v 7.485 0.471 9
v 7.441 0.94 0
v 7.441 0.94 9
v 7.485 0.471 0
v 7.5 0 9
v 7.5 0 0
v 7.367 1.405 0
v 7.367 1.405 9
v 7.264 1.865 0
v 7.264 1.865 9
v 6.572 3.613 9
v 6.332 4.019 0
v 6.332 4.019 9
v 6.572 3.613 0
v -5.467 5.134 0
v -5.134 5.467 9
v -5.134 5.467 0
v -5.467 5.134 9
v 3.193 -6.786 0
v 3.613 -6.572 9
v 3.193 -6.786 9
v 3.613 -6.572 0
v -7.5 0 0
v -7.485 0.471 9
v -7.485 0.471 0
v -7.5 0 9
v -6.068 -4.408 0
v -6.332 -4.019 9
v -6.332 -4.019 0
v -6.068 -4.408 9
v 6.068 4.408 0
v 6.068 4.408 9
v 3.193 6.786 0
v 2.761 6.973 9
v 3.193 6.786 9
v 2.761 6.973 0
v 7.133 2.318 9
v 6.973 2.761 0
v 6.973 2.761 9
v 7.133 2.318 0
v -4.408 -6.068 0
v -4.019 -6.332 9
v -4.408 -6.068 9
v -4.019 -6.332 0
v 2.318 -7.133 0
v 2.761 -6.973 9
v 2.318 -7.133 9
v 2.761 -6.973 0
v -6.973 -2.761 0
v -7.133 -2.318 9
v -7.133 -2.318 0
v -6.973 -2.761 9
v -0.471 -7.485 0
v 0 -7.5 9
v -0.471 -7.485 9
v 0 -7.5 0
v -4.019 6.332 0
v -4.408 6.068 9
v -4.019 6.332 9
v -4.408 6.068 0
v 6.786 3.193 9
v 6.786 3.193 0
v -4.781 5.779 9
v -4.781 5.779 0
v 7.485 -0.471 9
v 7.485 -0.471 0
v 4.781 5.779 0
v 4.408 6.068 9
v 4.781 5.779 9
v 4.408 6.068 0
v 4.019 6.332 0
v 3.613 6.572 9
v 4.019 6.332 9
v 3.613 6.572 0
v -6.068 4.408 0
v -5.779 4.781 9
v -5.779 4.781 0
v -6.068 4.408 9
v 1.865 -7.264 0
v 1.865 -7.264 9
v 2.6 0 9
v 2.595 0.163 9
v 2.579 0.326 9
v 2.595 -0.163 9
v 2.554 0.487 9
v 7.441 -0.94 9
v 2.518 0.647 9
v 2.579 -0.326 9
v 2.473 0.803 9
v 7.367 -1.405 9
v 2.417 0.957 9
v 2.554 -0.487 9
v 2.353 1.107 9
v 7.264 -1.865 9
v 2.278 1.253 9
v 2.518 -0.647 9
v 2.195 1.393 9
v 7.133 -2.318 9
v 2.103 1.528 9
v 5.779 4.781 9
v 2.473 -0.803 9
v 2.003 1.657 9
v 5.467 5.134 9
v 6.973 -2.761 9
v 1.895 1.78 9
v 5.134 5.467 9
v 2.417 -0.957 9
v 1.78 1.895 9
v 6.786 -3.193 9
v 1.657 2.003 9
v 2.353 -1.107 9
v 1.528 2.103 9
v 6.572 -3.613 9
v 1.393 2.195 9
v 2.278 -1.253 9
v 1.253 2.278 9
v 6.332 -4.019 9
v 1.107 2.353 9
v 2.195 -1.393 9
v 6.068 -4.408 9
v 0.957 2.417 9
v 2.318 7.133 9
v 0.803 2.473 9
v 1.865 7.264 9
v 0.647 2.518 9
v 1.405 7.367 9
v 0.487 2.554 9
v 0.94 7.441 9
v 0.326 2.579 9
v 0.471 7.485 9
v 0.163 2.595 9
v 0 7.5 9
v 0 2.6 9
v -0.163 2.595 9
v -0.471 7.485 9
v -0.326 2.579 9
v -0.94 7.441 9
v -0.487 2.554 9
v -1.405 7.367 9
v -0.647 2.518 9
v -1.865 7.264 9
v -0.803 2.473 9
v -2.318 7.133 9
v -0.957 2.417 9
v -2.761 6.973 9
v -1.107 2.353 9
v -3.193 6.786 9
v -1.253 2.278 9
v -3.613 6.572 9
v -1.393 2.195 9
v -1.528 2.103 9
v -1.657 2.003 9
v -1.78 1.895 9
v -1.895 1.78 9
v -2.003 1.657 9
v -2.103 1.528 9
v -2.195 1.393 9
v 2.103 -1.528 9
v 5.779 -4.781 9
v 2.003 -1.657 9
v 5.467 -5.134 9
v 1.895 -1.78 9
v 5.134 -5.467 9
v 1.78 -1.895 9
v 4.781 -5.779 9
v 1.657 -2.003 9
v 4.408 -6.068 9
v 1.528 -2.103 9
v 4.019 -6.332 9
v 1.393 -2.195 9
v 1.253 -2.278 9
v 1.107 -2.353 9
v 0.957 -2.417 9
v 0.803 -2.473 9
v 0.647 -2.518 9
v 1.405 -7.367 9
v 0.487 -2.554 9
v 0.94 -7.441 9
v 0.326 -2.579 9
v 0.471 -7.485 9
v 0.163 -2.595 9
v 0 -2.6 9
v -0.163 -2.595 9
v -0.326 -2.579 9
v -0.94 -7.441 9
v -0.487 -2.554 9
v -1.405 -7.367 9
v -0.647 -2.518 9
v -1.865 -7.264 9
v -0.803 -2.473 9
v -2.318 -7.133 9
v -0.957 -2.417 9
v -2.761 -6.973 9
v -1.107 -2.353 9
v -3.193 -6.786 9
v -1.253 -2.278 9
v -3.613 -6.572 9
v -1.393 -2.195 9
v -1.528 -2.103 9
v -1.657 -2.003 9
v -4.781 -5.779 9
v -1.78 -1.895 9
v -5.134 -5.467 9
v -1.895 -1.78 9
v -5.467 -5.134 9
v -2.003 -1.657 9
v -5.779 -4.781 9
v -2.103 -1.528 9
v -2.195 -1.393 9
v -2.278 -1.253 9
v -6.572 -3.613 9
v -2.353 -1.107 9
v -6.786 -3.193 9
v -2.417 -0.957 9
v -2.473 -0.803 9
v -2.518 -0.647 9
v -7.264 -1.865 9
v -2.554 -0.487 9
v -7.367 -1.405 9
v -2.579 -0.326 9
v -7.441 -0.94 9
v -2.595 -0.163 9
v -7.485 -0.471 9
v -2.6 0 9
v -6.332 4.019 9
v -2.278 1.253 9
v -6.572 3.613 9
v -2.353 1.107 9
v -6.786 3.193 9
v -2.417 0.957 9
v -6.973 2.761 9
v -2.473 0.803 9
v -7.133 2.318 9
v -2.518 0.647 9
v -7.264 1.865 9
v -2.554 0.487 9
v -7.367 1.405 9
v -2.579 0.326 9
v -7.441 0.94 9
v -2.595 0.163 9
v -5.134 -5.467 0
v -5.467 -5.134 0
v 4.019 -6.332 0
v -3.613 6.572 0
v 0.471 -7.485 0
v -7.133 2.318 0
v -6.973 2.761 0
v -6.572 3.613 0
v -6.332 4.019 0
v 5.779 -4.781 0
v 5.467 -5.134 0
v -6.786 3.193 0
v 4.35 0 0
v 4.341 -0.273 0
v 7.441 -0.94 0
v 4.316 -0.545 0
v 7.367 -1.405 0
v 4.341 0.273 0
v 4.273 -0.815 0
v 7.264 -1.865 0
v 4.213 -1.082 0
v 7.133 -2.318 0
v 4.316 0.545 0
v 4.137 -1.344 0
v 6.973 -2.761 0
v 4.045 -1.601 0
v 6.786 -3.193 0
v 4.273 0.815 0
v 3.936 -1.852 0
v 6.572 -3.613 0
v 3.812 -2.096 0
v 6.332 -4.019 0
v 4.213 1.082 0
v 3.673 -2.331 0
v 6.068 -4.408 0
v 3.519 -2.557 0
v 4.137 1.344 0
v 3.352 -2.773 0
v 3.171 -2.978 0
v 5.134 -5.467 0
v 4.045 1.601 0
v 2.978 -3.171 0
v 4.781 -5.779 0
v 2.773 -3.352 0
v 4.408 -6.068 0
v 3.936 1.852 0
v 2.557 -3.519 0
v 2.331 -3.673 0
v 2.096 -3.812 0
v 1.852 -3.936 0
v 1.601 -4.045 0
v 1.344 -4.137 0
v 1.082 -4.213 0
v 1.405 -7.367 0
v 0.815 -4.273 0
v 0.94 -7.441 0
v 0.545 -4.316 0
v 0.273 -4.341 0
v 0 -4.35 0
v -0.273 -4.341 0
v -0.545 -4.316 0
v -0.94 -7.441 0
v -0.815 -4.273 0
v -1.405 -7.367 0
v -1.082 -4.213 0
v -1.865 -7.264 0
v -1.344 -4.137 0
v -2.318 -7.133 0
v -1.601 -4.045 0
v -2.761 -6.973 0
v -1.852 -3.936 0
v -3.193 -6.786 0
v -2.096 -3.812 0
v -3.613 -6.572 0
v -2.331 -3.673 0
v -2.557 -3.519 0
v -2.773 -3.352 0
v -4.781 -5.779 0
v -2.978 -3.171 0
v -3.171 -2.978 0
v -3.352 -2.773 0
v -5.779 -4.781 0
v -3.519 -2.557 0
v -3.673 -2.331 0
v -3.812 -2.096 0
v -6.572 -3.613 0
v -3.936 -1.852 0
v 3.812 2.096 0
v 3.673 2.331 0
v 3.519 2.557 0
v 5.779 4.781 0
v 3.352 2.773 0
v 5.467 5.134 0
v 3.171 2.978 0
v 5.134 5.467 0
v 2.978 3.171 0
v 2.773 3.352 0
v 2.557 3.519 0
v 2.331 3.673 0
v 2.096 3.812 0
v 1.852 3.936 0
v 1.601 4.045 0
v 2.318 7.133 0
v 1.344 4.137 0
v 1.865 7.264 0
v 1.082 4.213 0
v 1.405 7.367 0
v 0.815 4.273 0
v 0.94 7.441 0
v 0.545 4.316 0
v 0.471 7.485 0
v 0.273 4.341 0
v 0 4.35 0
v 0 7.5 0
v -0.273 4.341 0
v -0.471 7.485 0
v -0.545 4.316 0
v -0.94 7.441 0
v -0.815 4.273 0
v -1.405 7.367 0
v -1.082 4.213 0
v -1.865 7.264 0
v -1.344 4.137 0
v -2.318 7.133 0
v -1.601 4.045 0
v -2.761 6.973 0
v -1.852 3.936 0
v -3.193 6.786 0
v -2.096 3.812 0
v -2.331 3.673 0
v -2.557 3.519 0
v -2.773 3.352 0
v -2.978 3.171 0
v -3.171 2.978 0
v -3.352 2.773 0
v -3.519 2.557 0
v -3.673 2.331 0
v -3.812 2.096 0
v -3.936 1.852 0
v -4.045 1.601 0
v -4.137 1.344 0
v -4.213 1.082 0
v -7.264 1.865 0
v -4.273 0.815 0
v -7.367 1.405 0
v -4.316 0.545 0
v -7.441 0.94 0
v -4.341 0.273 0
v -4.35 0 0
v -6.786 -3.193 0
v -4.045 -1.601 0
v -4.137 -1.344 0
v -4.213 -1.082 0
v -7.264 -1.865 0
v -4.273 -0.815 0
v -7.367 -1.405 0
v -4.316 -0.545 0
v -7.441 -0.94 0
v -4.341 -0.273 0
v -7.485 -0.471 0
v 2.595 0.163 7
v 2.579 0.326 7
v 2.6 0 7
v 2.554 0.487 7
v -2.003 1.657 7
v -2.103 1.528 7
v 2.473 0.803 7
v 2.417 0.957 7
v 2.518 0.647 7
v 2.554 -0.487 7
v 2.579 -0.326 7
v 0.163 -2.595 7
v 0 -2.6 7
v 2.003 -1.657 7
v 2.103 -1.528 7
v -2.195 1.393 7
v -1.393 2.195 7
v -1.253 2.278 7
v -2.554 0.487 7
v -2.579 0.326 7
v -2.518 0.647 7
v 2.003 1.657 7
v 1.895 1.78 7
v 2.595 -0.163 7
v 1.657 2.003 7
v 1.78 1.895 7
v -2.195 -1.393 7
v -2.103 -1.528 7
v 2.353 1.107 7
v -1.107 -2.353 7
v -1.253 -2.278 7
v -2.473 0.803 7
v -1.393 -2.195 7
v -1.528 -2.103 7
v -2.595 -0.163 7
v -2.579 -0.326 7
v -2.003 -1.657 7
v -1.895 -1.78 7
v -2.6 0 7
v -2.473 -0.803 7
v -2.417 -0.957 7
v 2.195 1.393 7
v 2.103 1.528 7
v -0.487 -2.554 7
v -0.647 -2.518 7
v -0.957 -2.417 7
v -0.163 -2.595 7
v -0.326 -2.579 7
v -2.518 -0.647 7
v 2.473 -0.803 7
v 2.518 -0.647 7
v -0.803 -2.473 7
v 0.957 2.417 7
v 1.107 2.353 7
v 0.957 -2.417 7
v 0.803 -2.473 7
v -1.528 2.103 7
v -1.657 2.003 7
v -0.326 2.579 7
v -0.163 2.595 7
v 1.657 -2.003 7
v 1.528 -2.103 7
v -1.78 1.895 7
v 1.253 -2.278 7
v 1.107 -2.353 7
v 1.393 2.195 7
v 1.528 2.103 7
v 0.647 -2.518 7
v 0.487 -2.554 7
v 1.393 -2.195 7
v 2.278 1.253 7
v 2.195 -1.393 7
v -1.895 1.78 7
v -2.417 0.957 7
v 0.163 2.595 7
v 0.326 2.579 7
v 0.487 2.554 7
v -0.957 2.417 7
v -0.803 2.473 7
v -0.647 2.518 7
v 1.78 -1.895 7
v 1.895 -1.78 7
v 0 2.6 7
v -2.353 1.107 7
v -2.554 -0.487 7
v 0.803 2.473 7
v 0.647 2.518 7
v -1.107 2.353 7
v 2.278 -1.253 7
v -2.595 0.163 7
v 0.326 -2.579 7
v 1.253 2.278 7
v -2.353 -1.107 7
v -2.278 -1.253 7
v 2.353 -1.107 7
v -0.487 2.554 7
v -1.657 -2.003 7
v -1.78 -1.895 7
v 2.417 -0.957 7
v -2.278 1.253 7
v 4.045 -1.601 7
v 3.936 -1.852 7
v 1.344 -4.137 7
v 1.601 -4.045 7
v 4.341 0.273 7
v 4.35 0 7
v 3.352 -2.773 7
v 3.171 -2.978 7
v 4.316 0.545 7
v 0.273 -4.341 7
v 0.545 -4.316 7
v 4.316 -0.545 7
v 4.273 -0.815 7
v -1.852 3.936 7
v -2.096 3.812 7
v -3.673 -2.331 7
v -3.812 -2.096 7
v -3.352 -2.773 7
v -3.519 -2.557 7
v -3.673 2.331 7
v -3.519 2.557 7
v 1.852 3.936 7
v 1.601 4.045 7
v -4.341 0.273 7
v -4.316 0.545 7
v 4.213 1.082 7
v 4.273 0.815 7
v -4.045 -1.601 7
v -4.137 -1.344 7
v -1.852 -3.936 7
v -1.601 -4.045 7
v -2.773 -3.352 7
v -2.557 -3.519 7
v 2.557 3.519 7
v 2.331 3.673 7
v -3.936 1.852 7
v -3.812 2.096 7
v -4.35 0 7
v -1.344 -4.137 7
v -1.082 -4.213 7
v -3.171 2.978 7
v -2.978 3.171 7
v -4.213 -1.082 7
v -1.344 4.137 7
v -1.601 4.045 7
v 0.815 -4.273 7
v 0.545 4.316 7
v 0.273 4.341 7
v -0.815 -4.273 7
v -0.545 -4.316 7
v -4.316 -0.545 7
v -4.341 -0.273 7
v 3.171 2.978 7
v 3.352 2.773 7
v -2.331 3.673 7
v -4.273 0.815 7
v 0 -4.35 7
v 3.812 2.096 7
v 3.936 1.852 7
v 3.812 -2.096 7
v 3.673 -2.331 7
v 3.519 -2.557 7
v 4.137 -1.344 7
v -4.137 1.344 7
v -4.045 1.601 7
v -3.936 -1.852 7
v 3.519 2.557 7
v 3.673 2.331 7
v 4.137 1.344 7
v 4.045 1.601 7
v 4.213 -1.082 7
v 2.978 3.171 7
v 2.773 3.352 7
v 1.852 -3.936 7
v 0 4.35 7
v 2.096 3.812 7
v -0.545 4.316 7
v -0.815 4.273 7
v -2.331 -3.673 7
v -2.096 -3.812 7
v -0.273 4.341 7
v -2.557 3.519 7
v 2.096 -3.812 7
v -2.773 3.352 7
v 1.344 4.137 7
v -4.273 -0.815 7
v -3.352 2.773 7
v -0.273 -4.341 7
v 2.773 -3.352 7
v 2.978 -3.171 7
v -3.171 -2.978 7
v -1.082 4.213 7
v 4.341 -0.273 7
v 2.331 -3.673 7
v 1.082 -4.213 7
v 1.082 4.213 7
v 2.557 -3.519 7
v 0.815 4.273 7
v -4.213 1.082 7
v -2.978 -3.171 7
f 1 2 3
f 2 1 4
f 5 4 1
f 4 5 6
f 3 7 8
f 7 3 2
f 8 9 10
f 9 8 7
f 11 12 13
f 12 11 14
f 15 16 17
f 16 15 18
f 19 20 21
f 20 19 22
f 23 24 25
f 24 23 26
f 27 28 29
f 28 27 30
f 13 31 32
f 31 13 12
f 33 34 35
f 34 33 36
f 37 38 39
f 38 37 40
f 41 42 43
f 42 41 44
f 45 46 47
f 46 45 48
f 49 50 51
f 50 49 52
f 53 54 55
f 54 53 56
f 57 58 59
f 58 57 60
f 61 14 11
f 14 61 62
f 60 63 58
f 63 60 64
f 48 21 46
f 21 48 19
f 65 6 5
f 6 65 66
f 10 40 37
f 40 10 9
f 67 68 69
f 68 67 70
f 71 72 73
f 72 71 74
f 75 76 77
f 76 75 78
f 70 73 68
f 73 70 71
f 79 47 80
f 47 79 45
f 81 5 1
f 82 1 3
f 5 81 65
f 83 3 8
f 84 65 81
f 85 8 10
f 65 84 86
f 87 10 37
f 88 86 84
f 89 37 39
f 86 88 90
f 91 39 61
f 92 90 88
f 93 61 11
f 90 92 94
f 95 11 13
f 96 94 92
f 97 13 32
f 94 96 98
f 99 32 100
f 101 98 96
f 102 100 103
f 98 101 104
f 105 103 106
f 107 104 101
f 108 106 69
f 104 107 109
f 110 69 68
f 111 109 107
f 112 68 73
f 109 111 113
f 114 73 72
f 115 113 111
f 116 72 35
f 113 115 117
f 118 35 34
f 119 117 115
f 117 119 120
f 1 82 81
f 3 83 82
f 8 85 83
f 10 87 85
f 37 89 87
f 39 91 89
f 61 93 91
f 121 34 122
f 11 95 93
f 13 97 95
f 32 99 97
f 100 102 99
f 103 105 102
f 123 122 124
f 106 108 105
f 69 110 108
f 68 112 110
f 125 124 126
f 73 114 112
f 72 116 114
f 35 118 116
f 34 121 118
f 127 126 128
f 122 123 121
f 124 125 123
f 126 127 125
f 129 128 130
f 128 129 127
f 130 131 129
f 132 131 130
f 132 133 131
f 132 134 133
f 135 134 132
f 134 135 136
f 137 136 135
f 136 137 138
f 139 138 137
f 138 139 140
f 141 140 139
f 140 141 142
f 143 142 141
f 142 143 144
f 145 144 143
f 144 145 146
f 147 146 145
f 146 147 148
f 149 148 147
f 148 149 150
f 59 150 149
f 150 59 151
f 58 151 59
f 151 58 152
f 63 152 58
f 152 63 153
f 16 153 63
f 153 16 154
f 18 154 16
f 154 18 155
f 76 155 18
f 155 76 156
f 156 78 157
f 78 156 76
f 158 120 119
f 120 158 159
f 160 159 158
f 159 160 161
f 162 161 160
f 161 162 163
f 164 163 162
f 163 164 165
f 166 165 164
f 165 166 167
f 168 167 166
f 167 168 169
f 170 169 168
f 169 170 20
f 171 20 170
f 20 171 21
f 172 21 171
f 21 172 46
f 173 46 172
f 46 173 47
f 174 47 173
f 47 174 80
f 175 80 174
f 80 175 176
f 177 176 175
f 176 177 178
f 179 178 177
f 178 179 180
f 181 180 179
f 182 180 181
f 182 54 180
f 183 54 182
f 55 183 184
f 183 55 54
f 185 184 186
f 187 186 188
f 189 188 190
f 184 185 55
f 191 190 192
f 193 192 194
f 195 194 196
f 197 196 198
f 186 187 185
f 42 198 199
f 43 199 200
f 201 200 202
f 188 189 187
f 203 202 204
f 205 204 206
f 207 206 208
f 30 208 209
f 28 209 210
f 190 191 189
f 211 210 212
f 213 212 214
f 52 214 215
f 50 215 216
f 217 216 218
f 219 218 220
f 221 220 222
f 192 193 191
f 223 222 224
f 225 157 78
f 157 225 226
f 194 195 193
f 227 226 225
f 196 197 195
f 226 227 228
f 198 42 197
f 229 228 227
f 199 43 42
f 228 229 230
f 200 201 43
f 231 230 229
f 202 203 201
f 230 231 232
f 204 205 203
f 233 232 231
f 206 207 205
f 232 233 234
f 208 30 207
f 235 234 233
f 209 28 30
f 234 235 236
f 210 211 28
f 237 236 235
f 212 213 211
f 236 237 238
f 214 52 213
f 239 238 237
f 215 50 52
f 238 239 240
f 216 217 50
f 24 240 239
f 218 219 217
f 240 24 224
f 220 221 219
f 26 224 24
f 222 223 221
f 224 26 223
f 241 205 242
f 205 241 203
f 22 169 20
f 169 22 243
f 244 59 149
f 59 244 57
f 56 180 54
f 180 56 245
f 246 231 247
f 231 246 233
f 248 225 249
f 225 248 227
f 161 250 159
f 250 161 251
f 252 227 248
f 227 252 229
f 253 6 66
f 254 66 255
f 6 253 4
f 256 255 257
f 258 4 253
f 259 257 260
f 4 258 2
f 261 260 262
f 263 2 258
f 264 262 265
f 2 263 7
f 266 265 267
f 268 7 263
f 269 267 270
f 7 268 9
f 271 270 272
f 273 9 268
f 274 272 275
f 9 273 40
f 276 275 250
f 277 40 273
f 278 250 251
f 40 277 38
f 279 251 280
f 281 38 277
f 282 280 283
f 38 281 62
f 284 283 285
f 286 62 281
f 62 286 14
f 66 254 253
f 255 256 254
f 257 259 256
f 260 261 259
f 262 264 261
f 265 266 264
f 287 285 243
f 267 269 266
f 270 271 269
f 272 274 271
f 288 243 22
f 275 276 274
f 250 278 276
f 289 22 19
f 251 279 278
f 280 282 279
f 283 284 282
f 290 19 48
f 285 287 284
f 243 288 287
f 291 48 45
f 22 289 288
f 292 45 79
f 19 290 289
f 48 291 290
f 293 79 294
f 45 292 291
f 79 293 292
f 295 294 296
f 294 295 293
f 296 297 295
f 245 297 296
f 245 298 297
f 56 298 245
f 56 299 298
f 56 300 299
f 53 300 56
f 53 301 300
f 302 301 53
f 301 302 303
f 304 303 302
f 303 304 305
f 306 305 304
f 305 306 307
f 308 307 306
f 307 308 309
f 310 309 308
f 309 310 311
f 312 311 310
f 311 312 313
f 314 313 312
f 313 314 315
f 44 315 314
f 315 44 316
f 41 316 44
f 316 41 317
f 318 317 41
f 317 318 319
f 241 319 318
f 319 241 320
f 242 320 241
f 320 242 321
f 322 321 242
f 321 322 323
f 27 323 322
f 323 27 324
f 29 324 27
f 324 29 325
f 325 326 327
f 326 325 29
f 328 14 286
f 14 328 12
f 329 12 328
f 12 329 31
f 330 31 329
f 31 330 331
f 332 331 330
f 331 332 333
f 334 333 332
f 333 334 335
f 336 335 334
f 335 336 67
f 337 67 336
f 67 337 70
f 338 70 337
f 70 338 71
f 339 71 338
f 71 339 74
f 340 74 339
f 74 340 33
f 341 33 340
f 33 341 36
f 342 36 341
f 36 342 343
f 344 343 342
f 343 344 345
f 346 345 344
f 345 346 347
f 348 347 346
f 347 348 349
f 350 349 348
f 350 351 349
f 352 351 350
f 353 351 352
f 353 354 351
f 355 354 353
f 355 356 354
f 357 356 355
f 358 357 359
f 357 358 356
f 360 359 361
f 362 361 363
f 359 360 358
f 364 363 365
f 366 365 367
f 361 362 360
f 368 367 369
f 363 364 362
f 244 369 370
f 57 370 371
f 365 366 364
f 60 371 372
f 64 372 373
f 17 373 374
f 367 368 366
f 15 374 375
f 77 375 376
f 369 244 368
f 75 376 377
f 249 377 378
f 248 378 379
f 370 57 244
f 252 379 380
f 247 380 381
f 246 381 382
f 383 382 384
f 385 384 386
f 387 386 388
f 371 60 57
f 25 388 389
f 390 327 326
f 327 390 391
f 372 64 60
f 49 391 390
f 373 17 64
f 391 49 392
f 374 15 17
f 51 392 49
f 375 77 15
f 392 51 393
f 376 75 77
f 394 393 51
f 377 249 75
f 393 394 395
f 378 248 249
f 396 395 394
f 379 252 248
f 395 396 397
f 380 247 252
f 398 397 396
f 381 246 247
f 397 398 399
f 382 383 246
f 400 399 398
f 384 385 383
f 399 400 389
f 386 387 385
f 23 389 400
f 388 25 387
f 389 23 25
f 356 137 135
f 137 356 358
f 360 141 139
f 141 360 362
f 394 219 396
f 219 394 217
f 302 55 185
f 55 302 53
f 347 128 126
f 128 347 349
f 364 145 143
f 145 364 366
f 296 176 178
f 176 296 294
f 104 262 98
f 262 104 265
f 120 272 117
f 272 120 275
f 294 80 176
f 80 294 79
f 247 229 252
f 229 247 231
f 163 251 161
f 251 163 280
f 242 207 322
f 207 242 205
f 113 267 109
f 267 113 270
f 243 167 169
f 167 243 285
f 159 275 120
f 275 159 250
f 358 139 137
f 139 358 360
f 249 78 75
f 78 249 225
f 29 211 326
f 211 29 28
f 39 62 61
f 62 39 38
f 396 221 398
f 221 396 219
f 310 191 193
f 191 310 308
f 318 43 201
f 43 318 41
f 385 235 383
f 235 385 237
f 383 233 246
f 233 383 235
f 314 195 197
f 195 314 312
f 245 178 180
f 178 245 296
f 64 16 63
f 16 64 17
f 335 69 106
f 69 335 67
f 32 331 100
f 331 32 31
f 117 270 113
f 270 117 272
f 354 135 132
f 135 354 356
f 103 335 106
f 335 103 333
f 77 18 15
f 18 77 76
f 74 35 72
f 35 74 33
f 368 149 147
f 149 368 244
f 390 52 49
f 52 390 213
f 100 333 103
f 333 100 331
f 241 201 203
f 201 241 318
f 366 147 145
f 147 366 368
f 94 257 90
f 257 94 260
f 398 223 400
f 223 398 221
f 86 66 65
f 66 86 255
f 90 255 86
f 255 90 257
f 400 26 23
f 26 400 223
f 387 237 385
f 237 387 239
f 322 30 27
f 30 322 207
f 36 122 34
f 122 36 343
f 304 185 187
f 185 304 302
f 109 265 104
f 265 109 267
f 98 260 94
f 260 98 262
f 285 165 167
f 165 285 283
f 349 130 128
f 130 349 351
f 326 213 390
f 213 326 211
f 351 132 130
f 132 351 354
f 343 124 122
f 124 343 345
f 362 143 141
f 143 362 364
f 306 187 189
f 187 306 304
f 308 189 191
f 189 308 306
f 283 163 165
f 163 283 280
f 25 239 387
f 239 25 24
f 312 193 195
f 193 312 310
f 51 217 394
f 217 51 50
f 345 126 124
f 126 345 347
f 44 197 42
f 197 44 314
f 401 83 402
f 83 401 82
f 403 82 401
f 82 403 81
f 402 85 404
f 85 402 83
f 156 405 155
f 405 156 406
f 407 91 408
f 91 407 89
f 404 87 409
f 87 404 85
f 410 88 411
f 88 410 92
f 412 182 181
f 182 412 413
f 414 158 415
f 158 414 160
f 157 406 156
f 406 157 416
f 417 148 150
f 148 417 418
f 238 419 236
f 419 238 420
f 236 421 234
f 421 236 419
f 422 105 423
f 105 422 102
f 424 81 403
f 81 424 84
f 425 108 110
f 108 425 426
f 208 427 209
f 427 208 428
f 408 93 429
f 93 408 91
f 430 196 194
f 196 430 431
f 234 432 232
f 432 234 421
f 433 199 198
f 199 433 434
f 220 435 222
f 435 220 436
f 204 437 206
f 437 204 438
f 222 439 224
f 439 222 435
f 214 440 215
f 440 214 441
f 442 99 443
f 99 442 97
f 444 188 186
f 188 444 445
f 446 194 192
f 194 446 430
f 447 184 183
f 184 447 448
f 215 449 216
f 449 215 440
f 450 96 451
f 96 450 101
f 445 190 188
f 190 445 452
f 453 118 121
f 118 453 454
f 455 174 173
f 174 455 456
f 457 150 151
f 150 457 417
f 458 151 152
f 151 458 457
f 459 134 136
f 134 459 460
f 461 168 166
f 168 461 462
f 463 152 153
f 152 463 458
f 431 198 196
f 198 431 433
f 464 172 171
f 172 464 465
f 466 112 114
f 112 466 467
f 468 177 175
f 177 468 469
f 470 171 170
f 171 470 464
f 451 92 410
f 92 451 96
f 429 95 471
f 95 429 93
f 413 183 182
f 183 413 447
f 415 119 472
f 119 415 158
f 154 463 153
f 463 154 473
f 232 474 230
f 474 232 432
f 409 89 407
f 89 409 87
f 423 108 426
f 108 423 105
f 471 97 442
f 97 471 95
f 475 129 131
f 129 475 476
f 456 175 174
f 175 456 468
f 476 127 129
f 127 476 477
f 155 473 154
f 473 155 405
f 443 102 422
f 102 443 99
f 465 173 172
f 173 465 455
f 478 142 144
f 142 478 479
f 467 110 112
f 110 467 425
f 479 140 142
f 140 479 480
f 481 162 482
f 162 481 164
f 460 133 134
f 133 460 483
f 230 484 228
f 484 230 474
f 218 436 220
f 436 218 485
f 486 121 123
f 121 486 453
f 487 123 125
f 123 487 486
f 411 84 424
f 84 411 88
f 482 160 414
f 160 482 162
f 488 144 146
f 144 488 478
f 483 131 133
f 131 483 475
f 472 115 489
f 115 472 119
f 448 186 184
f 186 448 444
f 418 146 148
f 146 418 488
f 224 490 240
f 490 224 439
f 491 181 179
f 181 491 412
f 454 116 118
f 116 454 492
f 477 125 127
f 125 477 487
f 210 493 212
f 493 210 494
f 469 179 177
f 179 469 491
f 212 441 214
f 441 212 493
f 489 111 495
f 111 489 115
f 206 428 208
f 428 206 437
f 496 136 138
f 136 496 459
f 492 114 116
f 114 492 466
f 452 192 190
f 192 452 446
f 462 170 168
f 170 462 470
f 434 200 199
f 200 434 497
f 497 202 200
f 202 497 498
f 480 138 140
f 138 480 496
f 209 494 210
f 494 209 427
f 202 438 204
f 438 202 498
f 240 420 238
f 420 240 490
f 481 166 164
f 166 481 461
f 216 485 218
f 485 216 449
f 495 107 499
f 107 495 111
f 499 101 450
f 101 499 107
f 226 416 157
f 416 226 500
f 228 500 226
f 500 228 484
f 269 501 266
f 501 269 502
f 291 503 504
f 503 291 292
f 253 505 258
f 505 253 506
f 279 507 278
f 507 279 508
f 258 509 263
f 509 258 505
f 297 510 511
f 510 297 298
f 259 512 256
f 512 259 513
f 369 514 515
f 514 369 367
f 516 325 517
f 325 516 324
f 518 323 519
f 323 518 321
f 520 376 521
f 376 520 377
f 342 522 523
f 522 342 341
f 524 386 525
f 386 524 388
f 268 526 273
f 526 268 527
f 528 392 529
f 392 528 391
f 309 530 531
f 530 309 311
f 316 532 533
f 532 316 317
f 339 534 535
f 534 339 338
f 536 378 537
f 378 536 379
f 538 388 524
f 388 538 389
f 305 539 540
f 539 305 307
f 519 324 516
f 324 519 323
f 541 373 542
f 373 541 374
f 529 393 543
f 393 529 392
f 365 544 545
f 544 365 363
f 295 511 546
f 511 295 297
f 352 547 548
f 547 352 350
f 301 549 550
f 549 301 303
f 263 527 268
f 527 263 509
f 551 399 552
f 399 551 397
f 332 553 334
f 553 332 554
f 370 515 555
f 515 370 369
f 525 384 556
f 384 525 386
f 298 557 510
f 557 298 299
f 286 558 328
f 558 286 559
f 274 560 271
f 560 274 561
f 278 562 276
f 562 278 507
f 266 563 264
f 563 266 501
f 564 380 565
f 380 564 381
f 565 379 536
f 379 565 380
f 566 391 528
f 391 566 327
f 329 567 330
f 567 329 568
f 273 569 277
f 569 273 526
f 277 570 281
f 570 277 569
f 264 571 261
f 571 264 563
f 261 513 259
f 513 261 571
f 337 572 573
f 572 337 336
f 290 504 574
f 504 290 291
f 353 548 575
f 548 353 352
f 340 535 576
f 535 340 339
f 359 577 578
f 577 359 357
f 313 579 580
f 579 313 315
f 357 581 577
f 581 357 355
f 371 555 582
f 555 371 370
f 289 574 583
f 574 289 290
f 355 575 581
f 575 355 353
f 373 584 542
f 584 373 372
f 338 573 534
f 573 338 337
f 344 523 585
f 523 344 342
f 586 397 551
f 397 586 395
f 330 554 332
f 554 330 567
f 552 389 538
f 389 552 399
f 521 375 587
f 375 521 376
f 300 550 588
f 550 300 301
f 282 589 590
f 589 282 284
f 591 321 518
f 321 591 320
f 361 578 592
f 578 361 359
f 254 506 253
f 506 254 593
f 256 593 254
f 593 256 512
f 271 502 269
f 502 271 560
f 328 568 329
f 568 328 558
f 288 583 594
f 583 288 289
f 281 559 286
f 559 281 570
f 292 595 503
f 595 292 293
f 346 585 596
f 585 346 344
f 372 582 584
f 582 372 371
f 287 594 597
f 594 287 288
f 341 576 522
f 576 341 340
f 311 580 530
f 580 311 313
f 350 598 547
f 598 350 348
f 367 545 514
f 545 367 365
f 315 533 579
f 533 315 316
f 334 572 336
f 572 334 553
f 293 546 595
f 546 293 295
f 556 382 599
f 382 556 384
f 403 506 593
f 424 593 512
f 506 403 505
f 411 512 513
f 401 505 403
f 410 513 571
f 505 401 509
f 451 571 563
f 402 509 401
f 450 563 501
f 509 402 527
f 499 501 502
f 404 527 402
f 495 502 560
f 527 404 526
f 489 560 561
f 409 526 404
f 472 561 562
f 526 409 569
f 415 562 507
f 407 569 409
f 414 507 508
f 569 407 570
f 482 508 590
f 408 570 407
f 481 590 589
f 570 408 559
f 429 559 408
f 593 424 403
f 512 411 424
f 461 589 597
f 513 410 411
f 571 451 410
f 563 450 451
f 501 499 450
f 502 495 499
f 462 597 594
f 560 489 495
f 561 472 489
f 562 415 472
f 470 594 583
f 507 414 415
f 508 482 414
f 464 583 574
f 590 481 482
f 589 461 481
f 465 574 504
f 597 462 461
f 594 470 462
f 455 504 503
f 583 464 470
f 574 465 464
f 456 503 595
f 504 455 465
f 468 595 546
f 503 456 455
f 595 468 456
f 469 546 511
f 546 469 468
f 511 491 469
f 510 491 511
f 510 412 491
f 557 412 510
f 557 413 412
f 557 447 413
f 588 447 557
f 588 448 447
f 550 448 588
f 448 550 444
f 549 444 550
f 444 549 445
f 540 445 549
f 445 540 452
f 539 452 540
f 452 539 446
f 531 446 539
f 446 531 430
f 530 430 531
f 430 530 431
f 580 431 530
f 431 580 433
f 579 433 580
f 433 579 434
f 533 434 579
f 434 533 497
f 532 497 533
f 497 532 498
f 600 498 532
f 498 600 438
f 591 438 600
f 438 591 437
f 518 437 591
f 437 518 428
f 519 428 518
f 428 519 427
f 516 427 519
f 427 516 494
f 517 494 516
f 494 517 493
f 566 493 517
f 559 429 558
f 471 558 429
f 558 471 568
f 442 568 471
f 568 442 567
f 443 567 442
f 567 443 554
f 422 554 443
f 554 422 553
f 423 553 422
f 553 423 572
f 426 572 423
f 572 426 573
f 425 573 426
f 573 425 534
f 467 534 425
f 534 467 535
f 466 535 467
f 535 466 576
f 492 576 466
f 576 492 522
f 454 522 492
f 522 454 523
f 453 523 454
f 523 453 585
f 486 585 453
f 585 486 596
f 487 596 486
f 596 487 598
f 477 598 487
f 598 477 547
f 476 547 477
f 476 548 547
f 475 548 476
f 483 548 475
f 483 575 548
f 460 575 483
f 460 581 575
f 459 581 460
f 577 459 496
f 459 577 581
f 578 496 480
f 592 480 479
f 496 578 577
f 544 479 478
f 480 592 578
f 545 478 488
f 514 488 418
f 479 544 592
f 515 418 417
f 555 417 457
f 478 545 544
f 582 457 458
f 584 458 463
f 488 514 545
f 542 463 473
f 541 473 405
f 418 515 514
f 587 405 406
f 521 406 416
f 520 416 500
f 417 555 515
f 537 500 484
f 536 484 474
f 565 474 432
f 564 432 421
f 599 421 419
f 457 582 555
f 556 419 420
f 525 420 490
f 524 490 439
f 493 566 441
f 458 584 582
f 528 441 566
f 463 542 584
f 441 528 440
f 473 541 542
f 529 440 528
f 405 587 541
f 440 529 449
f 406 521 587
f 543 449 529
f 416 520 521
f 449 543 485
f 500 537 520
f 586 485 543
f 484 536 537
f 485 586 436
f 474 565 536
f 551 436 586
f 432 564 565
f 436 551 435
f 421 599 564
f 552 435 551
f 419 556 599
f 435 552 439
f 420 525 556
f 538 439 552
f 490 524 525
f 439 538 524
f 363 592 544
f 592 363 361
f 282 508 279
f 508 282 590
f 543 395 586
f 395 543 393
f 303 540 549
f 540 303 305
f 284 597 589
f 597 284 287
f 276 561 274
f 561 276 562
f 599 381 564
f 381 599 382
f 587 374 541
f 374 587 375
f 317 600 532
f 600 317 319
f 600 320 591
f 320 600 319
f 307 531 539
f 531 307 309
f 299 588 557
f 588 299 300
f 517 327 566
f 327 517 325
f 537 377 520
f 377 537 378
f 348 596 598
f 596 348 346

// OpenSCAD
BOLT_DIA = 5.2;
BOLT_HEAD_DIA = 8.7;
BOLT_HEAD_LENGTH = 5;

TOP_DIA = 15;
TOP_THICKNESS = 2;
TOP_HEIGHT = BOLT_HEAD_LENGTH + TOP_THICKNESS * 2;

SLEEVE_OUTER_DIA = TOP_DIA;
SLEEVE_INNER_DIA = BOLT_DIA + 0.6;
SLEEVE_LENGTH = 20;

BOTTOM_HOLE_DIA = BOLT_DIA - 0.4;
BOTTOM_INNER_DIA = SLEEVE_OUTER_DIA + 0.6;
BOTTOM_OUTER_DIA = BOTTOM_INNER_DIA + 3;
BOTTOM_HEIGHT = 30;

MAGNET_DIA = 15;
MAGNET_THICKNESS = 3;

$fn = 100;

module sleeve() {
  difference() {
    cylinder(d = SLEEVE_OUTER_DIA, h = SLEEVE_LENGTH);
    cylinder(d = SLEEVE_INNER_DIA, h = SLEEVE_LENGTH);
  }
}

module top() {
  difference() {
    cylinder(d = TOP_DIA, h = TOP_HEIGHT);
    cylinder(d = BOLT_DIA, h = TOP_HEIGHT);
    cylinder(d = BOLT_HEAD_DIA, h = TOP_HEIGHT - TOP_THICKNESS);
  }
}

module bottom() {
  difference() {
    cylinder(d = BOTTOM_OUTER_DIA, h = BOTTOM_HEIGHT);
    cylinder(d = BOTTOM_HOLE_DIA, h = BOTTOM_HEIGHT);
    cylinder(d = BOTTOM_INNER_DIA, h = SLEEVE_LENGTH);
    translate([0, 0, BOTTOM_HEIGHT - MAGNET_THICKNESS])
    cylinder(d = MAGNET_DIA, h = MAGNET_THICKNESS);
  }
}


bottom();
!top();
sleeve();
